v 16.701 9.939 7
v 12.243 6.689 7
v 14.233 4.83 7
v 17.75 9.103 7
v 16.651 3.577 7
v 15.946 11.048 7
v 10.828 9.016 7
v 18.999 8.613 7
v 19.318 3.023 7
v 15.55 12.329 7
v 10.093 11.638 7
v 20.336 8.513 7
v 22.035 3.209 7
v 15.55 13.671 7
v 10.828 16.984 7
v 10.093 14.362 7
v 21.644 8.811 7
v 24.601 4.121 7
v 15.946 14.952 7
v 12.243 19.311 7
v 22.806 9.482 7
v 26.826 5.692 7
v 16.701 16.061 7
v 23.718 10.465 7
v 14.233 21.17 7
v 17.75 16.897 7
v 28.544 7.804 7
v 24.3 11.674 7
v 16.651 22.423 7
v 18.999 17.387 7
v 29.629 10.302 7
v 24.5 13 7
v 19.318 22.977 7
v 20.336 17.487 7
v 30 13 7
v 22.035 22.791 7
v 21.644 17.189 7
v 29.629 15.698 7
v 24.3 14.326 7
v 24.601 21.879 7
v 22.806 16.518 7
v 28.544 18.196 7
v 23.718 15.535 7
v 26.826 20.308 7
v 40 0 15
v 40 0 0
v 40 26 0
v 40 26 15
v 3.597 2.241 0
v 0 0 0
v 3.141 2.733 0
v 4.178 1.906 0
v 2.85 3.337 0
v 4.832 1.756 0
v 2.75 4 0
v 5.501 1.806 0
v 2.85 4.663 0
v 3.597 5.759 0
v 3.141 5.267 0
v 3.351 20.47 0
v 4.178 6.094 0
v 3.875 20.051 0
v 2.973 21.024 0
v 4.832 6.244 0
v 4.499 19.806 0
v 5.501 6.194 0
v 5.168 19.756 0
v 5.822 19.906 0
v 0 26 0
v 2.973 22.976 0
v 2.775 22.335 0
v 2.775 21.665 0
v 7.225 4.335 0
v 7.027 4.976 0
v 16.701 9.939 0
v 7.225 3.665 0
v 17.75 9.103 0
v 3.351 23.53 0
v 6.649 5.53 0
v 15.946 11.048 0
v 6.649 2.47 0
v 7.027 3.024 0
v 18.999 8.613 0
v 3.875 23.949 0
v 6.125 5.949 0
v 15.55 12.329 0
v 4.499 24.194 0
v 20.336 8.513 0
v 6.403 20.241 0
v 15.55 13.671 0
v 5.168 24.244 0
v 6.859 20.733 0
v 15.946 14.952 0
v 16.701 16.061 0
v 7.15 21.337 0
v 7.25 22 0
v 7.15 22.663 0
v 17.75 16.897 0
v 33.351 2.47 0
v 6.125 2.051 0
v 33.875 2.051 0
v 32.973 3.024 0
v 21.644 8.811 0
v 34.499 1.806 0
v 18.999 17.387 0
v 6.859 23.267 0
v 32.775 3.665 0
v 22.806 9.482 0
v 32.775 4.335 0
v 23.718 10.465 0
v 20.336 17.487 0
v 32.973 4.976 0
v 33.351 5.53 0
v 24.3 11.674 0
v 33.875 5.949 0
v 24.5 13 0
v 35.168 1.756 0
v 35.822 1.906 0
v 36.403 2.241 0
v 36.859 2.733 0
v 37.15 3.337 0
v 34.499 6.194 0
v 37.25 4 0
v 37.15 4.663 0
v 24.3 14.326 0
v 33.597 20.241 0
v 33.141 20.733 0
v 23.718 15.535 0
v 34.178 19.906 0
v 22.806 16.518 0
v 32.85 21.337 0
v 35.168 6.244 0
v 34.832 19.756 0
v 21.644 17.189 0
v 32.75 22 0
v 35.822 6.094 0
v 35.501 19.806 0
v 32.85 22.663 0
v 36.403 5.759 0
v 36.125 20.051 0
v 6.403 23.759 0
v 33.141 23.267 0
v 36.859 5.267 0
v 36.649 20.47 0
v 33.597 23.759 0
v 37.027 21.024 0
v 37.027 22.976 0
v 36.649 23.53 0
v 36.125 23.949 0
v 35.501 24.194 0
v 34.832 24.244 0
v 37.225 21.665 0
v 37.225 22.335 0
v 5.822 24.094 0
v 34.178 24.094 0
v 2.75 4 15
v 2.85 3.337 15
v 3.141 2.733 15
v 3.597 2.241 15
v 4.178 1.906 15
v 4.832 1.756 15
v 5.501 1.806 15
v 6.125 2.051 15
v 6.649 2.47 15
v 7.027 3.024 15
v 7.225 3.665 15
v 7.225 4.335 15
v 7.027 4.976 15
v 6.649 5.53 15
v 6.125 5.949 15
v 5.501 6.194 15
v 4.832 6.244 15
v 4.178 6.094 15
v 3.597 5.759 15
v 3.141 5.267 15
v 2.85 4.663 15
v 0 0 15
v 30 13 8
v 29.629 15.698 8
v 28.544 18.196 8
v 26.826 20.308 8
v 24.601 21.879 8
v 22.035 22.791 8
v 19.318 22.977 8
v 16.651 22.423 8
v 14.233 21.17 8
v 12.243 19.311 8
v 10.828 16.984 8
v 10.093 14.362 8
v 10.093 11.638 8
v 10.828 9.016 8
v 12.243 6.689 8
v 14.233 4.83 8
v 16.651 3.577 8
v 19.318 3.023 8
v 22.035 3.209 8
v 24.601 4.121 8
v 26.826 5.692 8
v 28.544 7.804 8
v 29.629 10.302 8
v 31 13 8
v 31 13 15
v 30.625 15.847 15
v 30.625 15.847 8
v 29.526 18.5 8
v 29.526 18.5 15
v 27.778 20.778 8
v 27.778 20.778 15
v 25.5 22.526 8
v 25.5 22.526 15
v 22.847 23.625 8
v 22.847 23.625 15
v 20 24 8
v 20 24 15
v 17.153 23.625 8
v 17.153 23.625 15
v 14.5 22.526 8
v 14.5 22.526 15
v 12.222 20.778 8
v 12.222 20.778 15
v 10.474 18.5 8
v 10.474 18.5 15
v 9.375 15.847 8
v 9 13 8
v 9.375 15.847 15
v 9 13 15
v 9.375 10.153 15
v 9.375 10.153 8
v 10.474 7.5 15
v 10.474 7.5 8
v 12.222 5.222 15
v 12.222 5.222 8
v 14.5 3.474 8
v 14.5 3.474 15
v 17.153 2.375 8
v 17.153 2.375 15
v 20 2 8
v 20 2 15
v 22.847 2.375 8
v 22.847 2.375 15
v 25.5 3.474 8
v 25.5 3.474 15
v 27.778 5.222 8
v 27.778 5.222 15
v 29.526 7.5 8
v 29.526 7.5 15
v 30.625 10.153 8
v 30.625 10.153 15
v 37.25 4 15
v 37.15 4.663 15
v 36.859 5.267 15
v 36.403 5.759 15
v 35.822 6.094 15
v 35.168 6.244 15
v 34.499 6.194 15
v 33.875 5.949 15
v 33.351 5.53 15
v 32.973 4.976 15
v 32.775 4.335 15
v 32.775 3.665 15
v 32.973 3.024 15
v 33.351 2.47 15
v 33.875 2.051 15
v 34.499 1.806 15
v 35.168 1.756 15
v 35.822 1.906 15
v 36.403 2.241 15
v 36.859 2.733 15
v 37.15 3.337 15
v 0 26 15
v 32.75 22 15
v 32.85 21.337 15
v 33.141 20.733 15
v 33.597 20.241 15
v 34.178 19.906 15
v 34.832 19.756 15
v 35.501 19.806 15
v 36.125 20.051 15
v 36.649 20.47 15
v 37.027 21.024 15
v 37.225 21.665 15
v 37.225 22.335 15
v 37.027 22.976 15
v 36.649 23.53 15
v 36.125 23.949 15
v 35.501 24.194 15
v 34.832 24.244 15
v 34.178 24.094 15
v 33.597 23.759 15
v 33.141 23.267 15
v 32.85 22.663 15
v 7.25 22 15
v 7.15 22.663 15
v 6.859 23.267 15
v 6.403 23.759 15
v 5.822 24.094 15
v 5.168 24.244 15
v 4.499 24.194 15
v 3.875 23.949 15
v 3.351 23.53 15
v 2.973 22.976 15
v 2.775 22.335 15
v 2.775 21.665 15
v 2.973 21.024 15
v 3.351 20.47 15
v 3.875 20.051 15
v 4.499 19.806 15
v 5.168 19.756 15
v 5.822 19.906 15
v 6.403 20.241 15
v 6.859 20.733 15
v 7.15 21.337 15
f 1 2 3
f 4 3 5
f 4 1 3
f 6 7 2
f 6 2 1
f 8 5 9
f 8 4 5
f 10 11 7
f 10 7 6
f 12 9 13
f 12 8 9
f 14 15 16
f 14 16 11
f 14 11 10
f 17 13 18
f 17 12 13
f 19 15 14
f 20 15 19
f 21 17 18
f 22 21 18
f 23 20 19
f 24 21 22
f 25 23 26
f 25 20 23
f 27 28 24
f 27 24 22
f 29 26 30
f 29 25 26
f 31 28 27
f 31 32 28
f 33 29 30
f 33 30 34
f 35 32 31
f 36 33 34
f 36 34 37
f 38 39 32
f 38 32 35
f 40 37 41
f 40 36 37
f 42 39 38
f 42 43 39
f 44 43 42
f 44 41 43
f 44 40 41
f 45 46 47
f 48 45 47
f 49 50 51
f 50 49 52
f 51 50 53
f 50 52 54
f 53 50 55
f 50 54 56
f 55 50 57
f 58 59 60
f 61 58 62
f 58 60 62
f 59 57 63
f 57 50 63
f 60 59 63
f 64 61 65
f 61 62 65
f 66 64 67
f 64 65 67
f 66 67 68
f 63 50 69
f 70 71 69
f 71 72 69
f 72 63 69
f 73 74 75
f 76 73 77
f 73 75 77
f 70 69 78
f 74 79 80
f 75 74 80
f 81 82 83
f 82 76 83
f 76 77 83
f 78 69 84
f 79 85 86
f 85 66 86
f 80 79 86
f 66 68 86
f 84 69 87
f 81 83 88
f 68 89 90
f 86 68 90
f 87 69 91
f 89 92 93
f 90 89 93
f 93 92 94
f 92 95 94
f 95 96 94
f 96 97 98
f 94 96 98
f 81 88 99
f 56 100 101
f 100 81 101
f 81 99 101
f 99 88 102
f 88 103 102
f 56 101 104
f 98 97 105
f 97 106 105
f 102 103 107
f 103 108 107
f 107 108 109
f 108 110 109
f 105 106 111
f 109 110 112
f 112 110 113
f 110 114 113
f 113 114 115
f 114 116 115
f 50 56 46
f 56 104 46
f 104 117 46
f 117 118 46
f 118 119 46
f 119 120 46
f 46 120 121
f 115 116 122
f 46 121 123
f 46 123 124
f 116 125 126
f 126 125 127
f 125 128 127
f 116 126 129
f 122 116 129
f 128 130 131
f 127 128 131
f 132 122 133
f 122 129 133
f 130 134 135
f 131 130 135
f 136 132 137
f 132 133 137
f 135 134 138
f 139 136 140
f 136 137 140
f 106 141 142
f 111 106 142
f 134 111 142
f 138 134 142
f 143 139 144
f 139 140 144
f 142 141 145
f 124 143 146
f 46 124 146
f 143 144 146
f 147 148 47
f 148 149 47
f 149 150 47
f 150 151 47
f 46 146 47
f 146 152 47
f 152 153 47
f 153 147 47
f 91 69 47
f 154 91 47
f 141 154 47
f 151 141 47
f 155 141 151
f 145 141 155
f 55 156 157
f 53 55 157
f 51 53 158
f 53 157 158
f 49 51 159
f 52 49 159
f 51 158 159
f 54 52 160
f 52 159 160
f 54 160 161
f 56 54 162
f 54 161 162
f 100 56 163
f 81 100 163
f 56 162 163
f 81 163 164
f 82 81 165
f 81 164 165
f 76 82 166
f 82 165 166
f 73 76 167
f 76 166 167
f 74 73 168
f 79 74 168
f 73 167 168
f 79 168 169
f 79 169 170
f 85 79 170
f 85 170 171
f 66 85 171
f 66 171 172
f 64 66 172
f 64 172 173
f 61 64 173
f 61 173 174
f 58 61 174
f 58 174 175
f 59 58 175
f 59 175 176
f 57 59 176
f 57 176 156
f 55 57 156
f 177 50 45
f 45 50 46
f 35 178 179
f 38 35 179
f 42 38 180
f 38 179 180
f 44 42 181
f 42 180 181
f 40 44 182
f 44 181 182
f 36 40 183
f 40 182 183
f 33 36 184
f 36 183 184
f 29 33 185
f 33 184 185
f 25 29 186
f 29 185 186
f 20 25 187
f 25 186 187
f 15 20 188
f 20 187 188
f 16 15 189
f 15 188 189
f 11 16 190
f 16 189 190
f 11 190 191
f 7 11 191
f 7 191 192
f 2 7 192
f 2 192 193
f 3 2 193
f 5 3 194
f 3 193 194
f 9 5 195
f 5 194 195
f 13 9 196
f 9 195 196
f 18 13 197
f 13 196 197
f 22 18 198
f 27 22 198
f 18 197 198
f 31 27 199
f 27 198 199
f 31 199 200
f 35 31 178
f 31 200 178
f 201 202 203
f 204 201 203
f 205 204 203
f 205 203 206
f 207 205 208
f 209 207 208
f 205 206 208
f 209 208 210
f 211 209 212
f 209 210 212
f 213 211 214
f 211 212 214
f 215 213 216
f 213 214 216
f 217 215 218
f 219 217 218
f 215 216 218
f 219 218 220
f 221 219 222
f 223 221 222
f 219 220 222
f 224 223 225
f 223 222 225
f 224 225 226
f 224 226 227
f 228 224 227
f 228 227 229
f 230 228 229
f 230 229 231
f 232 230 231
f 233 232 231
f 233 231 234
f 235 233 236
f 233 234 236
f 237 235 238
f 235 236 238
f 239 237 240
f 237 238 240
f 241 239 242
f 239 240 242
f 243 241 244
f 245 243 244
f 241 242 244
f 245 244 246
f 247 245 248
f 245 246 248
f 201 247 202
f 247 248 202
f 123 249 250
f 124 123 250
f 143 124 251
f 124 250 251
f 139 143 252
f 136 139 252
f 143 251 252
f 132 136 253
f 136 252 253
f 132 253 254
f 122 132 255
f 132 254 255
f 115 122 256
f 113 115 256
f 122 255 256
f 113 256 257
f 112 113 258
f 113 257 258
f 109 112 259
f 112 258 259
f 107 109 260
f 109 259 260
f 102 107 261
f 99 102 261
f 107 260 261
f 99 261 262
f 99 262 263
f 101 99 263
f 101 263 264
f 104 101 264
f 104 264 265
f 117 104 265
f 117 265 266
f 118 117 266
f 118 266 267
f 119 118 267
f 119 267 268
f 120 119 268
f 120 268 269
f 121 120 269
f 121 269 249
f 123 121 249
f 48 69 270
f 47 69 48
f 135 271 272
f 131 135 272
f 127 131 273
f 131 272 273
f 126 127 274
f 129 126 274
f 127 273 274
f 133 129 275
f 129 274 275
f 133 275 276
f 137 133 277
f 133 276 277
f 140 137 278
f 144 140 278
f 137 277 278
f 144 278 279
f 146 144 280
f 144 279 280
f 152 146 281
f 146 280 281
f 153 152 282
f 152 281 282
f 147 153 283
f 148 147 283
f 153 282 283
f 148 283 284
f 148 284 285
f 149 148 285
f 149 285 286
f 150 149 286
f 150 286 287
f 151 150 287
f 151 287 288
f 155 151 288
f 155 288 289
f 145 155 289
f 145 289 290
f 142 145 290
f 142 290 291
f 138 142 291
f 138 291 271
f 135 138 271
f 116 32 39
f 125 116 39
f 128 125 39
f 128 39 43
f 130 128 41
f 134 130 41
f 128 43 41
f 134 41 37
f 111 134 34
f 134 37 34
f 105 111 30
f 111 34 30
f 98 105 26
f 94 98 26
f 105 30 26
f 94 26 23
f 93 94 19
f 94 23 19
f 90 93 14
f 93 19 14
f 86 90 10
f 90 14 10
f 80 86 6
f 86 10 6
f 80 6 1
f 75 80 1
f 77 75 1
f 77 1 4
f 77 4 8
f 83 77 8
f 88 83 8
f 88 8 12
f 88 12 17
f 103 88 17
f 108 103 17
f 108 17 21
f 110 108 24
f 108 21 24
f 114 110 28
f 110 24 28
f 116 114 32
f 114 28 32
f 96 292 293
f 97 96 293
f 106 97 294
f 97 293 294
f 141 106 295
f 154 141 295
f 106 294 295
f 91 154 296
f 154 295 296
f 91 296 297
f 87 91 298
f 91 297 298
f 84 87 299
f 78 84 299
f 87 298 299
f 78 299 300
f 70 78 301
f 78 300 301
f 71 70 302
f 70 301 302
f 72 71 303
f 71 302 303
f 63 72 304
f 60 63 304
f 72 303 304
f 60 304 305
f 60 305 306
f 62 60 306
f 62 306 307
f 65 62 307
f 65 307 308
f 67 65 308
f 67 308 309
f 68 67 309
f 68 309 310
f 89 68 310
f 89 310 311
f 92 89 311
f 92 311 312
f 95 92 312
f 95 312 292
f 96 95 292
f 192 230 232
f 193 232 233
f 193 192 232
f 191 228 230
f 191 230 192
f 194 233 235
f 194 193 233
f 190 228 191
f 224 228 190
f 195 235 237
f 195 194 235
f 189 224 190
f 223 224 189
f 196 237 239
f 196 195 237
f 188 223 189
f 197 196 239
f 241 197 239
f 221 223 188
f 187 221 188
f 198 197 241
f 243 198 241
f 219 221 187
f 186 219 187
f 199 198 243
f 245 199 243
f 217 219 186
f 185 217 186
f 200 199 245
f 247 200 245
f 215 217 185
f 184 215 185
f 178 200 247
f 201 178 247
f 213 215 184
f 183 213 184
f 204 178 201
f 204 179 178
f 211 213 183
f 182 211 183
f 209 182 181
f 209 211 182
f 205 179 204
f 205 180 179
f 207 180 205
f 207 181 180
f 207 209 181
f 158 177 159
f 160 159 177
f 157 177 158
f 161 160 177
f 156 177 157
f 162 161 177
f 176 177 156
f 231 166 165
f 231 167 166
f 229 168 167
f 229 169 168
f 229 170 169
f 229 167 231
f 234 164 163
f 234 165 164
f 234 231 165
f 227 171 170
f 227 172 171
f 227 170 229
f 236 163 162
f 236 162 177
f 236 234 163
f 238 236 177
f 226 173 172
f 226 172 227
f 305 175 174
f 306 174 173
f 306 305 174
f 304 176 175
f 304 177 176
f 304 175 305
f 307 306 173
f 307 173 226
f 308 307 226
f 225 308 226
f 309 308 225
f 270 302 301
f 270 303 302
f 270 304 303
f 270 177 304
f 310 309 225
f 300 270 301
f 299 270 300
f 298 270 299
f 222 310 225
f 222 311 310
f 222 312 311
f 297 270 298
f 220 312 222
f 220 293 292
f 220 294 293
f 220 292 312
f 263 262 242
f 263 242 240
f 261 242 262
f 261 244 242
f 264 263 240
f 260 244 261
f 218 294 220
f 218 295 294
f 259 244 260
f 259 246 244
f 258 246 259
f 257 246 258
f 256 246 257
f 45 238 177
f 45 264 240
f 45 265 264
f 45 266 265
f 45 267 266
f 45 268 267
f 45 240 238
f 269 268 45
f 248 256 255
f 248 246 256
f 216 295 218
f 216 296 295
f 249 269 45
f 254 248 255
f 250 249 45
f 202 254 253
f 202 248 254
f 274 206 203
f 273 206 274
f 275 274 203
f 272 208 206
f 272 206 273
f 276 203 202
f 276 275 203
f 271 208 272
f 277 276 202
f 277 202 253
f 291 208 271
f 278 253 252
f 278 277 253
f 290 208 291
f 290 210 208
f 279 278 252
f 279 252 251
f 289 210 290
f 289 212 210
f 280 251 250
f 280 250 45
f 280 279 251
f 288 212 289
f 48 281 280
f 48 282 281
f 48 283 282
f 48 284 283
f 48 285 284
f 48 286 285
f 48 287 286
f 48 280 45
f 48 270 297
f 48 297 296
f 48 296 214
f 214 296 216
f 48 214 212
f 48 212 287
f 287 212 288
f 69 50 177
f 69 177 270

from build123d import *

# Parameters (mm, degrees)
ESQUISSE1_W             = 40
ESQUISSE1_H             = 26
BOSS_EXTRU_1_DEPTH      = 15
ESQUISSE2_R             = 11
ENL_V_MAT_EXTRU_1_DEPTH = 7
ESQUISSE3_R             = 10
ENL_V_MAT_EXTRU_2_DEPTH = 1
ESQUISSE4_R             = 4.5
ENL_V_MAT_EXTRU_3_DEPTH = 7
ESQUISSE5_R             = 2.25
ENL_V_MAT_EXTRU_4_DEPTH = 51.009999


with BuildPart() as part:
    # Esquisse1 → Boss.-Extru.1 (new body)
    with BuildSketch(Plane.XY):
        with Locations((20, 13)):
            Rectangle(ESQUISSE1_W, ESQUISSE1_H)
    extrude(amount=BOSS_EXTRU_1_DEPTH)

    # Esquisse2 → Enlèv. mat.-Extru.1 (cut)
    with BuildSketch(Plane.XY.offset(15)):
        with Locations((20, 13)):
            Circle(ESQUISSE2_R)
    extrude(amount=-ENL_V_MAT_EXTRU_1_DEPTH, mode=Mode.SUBTRACT)

    # Esquisse3 → Enlèv. mat.-Extru.2 (cut)
    with BuildSketch(Plane.XY.offset(8)):
        with Locations((20, 13)):
            Circle(ESQUISSE3_R)
    extrude(amount=-ENL_V_MAT_EXTRU_2_DEPTH, mode=Mode.SUBTRACT)

    # Esquisse4 → Enlèv. mat.-Extru.3 (cut)
    with BuildSketch(Plane.XY.offset(7)):
        with Locations((20, 13)):
            Circle(ESQUISSE4_R)
    extrude(amount=-ENL_V_MAT_EXTRU_3_DEPTH, mode=Mode.SUBTRACT)

    # Esquisse5 → Enlèv. mat.-Extru.4 (cut, through all)
    with BuildSketch(Plane.XY.offset(15)):
        with Locations((5, 22)):
            Circle(ESQUISSE5_R)
        with Locations(Location((5, 4, 0), (0, 0, 180))):
            Circle(ESQUISSE5_R)
        with Locations((35, 4)):
            Circle(ESQUISSE5_R)
        with Locations(Location((35, 22, 0), (0, 0, 180))):
            Circle(ESQUISSE5_R)
    extrude(amount=-ENL_V_MAT_EXTRU_4_DEPTH, mode=Mode.SUBTRACT)


solid = part.part
